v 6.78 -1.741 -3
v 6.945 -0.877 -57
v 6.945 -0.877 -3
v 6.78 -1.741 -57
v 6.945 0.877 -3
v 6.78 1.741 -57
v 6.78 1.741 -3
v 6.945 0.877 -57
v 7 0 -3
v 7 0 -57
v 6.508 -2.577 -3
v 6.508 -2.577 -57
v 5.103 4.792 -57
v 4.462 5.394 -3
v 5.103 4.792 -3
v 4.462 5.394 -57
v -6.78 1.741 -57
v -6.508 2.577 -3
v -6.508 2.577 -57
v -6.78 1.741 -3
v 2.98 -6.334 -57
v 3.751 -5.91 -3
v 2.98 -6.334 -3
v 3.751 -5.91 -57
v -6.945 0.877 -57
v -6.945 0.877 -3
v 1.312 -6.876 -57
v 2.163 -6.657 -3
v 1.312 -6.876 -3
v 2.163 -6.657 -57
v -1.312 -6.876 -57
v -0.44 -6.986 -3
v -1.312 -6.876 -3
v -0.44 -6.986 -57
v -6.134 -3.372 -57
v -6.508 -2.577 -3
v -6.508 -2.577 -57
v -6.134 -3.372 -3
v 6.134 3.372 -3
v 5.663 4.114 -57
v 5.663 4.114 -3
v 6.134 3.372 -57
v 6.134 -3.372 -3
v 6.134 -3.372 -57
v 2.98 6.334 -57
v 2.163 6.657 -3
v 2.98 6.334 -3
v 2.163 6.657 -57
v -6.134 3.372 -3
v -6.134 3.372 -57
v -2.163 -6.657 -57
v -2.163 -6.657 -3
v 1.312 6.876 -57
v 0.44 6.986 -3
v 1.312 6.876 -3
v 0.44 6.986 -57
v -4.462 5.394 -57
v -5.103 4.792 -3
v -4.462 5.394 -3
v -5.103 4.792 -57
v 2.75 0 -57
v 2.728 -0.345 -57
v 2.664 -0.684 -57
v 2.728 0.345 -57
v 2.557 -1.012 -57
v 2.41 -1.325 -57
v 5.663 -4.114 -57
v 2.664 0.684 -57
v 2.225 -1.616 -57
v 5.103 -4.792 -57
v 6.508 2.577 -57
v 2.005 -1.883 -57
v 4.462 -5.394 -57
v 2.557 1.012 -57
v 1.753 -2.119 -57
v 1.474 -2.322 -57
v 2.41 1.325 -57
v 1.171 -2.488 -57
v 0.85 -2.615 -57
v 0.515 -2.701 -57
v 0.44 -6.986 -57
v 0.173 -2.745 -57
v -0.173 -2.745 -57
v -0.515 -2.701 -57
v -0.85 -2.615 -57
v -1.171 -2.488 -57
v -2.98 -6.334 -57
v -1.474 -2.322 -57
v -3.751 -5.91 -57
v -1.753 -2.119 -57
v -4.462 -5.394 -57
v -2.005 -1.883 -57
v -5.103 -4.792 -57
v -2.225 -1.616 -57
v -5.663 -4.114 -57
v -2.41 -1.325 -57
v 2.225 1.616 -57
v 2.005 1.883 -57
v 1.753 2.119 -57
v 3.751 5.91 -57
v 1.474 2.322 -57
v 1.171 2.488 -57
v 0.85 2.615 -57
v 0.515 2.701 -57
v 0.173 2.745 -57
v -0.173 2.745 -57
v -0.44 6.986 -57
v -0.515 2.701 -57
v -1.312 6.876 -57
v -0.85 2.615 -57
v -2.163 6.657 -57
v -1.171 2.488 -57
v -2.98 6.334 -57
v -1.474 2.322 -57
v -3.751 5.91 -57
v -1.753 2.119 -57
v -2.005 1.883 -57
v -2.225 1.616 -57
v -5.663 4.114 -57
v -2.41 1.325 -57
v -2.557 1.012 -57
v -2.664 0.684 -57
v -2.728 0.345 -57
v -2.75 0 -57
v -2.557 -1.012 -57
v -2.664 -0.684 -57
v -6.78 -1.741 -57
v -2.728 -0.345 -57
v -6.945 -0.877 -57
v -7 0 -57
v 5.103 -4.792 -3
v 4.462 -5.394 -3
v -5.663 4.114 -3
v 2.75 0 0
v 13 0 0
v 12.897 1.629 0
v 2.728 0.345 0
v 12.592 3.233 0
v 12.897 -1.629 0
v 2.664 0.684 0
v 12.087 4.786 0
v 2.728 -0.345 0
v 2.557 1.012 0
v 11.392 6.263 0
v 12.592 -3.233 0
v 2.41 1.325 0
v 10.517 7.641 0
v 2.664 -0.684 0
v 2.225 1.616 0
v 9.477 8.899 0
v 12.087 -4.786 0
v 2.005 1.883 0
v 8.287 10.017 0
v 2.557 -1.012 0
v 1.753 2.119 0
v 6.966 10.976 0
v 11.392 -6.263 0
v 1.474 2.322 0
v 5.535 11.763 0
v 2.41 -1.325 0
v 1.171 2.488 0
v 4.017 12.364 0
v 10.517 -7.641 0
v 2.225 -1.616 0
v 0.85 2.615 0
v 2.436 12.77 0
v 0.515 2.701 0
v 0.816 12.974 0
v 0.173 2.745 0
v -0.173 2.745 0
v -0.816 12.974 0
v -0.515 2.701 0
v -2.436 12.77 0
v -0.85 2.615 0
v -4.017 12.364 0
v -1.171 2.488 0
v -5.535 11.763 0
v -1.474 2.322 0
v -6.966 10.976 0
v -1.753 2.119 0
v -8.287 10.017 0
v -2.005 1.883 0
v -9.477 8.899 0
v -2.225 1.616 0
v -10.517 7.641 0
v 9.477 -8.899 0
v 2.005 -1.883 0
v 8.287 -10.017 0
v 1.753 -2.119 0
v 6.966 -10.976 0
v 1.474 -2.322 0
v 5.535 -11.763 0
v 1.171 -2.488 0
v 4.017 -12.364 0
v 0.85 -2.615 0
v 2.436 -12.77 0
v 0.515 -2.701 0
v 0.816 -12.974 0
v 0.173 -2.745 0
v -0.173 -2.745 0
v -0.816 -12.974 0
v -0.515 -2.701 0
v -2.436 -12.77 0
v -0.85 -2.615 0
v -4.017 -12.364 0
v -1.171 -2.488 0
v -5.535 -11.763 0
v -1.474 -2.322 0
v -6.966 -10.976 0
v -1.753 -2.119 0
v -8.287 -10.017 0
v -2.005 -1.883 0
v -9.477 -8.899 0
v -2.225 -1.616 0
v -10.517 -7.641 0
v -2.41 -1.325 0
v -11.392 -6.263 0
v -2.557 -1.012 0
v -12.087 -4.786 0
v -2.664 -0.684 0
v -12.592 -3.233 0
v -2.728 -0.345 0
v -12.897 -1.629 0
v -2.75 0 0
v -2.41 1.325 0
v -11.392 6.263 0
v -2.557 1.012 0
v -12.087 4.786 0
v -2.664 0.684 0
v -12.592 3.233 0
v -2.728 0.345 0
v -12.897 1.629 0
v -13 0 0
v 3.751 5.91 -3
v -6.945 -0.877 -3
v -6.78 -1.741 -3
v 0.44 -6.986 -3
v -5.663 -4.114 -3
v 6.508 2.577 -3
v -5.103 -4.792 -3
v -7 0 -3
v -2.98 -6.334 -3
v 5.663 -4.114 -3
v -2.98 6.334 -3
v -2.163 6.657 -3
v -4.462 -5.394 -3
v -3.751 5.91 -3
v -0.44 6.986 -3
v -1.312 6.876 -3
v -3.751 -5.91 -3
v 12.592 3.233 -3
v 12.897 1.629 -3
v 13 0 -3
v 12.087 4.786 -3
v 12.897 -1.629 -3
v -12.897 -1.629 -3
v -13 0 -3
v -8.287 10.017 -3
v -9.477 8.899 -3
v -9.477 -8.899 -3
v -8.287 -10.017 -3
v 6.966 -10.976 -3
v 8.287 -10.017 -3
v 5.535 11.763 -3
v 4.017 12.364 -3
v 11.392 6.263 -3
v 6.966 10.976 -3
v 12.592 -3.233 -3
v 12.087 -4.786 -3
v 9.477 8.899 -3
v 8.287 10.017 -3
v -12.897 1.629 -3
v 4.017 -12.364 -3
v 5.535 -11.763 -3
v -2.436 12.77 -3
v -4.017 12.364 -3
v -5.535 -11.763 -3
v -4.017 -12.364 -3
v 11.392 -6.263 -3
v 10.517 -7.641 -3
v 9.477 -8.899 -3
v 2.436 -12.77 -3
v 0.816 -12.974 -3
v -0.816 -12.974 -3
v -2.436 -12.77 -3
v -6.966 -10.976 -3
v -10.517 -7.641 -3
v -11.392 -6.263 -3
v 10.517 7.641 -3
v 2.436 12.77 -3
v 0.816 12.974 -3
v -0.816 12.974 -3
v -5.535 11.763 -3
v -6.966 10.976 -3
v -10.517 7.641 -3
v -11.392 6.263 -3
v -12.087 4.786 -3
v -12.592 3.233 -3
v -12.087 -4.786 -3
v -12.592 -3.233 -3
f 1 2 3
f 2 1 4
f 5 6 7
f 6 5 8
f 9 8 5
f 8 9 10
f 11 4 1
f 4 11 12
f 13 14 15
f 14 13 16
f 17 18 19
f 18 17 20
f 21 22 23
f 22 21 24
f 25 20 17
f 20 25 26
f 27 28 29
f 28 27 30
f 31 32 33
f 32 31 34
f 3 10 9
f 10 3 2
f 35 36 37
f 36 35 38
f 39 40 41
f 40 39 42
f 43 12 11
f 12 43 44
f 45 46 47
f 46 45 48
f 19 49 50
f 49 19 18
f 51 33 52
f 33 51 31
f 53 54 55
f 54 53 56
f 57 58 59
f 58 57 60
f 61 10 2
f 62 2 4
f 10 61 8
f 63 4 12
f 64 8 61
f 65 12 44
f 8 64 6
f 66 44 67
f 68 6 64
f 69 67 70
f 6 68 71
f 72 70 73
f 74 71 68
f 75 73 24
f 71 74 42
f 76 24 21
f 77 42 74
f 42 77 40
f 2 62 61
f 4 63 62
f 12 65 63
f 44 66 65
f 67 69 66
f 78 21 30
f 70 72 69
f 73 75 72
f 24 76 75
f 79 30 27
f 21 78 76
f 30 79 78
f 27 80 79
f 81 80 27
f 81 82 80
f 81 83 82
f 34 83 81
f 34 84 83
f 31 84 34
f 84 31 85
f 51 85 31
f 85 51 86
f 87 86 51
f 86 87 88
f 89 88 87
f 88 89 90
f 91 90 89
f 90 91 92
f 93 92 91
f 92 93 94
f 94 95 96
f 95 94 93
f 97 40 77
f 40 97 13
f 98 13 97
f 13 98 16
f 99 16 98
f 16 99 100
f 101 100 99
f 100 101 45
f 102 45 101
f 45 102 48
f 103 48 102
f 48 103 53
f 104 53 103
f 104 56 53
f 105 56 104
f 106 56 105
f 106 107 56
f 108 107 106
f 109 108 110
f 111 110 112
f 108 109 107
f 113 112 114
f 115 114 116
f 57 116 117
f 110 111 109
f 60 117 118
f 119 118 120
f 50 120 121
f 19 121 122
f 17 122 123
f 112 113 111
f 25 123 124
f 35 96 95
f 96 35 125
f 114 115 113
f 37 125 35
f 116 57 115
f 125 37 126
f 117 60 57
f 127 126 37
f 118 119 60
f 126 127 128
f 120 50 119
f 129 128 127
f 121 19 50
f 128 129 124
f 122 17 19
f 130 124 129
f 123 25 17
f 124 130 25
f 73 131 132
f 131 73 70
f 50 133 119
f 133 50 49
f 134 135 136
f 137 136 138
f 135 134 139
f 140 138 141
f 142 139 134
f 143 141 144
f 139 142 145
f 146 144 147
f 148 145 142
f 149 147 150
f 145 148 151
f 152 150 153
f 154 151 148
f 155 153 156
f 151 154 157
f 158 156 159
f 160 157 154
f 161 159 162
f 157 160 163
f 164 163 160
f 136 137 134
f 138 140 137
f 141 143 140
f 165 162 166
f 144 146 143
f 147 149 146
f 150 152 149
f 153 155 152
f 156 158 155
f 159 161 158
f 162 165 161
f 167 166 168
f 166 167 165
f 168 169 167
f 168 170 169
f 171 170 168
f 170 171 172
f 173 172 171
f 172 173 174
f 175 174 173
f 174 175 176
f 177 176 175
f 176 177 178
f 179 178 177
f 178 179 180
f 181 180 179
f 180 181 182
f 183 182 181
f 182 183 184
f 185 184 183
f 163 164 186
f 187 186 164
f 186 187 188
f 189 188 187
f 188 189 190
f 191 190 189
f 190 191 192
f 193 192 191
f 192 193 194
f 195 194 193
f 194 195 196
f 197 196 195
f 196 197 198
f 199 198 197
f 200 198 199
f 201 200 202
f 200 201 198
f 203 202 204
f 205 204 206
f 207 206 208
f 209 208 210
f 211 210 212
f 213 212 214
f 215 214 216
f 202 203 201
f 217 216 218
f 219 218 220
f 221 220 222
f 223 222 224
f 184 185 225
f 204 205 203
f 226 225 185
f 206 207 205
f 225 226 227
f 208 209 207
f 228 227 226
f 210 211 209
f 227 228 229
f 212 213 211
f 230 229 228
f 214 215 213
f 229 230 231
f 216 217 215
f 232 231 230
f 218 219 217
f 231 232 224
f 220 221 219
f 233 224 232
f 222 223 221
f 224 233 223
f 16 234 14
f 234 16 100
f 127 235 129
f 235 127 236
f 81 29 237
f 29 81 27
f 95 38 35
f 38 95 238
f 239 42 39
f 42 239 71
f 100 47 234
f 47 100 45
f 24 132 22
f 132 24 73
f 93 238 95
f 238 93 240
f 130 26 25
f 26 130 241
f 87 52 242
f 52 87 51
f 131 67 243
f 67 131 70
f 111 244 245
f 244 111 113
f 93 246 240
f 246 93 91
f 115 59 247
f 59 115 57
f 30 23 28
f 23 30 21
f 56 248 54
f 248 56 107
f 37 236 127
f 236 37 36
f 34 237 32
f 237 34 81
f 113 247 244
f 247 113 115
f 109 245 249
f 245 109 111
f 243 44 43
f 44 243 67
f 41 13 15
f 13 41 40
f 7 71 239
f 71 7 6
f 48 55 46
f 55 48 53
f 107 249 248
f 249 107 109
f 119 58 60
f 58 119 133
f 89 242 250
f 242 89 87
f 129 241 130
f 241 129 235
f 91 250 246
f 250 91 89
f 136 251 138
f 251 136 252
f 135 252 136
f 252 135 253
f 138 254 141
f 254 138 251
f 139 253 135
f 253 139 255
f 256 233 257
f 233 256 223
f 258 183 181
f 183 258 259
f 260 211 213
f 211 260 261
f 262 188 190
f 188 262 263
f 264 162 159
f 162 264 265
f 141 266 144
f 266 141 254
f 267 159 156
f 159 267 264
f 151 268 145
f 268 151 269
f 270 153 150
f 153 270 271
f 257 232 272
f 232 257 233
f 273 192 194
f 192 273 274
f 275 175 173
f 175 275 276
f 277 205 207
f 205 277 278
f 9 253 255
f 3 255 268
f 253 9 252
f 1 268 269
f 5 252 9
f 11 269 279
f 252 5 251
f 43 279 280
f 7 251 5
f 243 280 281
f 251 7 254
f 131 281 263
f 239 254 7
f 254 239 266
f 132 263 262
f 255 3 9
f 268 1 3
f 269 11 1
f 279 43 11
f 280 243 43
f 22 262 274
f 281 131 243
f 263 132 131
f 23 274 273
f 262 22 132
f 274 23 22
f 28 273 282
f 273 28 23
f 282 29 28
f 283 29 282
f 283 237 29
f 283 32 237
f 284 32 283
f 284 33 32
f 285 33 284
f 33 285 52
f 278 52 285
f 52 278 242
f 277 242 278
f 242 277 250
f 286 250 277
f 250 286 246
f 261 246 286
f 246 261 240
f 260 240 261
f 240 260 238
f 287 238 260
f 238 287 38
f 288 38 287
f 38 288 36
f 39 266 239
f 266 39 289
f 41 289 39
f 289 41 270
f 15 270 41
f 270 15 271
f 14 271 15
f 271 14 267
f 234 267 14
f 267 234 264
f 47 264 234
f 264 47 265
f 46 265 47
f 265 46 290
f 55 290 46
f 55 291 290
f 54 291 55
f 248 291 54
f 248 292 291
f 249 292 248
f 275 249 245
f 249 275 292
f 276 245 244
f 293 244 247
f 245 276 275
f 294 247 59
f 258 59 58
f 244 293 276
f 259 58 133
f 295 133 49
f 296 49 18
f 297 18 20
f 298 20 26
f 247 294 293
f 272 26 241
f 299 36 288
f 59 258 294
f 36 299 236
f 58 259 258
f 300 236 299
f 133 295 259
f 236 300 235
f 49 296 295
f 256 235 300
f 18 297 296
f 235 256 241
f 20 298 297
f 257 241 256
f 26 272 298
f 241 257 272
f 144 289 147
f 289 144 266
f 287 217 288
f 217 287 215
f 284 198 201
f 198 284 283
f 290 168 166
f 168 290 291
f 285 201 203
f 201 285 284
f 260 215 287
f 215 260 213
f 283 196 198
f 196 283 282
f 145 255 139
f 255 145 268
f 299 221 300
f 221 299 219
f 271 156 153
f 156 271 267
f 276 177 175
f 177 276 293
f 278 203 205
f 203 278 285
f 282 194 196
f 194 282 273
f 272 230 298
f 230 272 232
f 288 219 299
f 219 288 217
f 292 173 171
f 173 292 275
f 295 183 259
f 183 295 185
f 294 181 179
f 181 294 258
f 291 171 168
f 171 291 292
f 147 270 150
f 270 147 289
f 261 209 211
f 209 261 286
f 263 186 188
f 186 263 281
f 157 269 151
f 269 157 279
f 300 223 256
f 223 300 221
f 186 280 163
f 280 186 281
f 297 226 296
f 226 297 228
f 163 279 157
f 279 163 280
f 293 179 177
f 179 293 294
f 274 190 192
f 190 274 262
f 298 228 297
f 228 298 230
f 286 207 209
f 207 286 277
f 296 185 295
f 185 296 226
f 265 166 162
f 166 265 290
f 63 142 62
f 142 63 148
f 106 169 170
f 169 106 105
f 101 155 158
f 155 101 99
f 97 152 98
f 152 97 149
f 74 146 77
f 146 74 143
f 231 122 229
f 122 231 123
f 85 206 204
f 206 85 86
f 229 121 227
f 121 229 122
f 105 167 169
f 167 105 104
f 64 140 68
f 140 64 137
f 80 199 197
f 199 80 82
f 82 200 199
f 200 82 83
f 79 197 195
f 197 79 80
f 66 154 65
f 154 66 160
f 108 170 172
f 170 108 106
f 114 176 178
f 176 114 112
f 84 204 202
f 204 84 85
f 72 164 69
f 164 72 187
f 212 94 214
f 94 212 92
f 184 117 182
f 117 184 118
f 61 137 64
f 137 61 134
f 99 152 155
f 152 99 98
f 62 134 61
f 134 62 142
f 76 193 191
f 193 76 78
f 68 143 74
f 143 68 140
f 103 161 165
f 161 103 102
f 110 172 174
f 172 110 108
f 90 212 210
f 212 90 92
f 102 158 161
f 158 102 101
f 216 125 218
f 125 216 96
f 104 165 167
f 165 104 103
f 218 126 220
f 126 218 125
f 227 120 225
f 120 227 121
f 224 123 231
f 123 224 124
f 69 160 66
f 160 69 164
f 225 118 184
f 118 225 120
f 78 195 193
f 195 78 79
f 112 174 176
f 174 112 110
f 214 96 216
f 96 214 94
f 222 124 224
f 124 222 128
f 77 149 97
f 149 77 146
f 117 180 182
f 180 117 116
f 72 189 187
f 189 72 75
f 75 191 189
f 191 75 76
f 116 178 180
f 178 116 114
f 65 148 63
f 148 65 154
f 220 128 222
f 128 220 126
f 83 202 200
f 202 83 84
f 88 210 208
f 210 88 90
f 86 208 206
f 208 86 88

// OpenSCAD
$fn = 50;


difference() {
	union() {
		translate(v = [0, 0, -57.0000000000]) {
			cylinder(h = 57, r = 7.0000000000);
		}
		translate(v = [0, 0, -3.0000000000]) {
			cylinder(h = 3, r = 13.0000000000);
		}
	}
	union() {
		#translate(v = [0, 0, -57]) {
			cylinder(h = 57, r = 2.7500000000);
		}
	}
}
